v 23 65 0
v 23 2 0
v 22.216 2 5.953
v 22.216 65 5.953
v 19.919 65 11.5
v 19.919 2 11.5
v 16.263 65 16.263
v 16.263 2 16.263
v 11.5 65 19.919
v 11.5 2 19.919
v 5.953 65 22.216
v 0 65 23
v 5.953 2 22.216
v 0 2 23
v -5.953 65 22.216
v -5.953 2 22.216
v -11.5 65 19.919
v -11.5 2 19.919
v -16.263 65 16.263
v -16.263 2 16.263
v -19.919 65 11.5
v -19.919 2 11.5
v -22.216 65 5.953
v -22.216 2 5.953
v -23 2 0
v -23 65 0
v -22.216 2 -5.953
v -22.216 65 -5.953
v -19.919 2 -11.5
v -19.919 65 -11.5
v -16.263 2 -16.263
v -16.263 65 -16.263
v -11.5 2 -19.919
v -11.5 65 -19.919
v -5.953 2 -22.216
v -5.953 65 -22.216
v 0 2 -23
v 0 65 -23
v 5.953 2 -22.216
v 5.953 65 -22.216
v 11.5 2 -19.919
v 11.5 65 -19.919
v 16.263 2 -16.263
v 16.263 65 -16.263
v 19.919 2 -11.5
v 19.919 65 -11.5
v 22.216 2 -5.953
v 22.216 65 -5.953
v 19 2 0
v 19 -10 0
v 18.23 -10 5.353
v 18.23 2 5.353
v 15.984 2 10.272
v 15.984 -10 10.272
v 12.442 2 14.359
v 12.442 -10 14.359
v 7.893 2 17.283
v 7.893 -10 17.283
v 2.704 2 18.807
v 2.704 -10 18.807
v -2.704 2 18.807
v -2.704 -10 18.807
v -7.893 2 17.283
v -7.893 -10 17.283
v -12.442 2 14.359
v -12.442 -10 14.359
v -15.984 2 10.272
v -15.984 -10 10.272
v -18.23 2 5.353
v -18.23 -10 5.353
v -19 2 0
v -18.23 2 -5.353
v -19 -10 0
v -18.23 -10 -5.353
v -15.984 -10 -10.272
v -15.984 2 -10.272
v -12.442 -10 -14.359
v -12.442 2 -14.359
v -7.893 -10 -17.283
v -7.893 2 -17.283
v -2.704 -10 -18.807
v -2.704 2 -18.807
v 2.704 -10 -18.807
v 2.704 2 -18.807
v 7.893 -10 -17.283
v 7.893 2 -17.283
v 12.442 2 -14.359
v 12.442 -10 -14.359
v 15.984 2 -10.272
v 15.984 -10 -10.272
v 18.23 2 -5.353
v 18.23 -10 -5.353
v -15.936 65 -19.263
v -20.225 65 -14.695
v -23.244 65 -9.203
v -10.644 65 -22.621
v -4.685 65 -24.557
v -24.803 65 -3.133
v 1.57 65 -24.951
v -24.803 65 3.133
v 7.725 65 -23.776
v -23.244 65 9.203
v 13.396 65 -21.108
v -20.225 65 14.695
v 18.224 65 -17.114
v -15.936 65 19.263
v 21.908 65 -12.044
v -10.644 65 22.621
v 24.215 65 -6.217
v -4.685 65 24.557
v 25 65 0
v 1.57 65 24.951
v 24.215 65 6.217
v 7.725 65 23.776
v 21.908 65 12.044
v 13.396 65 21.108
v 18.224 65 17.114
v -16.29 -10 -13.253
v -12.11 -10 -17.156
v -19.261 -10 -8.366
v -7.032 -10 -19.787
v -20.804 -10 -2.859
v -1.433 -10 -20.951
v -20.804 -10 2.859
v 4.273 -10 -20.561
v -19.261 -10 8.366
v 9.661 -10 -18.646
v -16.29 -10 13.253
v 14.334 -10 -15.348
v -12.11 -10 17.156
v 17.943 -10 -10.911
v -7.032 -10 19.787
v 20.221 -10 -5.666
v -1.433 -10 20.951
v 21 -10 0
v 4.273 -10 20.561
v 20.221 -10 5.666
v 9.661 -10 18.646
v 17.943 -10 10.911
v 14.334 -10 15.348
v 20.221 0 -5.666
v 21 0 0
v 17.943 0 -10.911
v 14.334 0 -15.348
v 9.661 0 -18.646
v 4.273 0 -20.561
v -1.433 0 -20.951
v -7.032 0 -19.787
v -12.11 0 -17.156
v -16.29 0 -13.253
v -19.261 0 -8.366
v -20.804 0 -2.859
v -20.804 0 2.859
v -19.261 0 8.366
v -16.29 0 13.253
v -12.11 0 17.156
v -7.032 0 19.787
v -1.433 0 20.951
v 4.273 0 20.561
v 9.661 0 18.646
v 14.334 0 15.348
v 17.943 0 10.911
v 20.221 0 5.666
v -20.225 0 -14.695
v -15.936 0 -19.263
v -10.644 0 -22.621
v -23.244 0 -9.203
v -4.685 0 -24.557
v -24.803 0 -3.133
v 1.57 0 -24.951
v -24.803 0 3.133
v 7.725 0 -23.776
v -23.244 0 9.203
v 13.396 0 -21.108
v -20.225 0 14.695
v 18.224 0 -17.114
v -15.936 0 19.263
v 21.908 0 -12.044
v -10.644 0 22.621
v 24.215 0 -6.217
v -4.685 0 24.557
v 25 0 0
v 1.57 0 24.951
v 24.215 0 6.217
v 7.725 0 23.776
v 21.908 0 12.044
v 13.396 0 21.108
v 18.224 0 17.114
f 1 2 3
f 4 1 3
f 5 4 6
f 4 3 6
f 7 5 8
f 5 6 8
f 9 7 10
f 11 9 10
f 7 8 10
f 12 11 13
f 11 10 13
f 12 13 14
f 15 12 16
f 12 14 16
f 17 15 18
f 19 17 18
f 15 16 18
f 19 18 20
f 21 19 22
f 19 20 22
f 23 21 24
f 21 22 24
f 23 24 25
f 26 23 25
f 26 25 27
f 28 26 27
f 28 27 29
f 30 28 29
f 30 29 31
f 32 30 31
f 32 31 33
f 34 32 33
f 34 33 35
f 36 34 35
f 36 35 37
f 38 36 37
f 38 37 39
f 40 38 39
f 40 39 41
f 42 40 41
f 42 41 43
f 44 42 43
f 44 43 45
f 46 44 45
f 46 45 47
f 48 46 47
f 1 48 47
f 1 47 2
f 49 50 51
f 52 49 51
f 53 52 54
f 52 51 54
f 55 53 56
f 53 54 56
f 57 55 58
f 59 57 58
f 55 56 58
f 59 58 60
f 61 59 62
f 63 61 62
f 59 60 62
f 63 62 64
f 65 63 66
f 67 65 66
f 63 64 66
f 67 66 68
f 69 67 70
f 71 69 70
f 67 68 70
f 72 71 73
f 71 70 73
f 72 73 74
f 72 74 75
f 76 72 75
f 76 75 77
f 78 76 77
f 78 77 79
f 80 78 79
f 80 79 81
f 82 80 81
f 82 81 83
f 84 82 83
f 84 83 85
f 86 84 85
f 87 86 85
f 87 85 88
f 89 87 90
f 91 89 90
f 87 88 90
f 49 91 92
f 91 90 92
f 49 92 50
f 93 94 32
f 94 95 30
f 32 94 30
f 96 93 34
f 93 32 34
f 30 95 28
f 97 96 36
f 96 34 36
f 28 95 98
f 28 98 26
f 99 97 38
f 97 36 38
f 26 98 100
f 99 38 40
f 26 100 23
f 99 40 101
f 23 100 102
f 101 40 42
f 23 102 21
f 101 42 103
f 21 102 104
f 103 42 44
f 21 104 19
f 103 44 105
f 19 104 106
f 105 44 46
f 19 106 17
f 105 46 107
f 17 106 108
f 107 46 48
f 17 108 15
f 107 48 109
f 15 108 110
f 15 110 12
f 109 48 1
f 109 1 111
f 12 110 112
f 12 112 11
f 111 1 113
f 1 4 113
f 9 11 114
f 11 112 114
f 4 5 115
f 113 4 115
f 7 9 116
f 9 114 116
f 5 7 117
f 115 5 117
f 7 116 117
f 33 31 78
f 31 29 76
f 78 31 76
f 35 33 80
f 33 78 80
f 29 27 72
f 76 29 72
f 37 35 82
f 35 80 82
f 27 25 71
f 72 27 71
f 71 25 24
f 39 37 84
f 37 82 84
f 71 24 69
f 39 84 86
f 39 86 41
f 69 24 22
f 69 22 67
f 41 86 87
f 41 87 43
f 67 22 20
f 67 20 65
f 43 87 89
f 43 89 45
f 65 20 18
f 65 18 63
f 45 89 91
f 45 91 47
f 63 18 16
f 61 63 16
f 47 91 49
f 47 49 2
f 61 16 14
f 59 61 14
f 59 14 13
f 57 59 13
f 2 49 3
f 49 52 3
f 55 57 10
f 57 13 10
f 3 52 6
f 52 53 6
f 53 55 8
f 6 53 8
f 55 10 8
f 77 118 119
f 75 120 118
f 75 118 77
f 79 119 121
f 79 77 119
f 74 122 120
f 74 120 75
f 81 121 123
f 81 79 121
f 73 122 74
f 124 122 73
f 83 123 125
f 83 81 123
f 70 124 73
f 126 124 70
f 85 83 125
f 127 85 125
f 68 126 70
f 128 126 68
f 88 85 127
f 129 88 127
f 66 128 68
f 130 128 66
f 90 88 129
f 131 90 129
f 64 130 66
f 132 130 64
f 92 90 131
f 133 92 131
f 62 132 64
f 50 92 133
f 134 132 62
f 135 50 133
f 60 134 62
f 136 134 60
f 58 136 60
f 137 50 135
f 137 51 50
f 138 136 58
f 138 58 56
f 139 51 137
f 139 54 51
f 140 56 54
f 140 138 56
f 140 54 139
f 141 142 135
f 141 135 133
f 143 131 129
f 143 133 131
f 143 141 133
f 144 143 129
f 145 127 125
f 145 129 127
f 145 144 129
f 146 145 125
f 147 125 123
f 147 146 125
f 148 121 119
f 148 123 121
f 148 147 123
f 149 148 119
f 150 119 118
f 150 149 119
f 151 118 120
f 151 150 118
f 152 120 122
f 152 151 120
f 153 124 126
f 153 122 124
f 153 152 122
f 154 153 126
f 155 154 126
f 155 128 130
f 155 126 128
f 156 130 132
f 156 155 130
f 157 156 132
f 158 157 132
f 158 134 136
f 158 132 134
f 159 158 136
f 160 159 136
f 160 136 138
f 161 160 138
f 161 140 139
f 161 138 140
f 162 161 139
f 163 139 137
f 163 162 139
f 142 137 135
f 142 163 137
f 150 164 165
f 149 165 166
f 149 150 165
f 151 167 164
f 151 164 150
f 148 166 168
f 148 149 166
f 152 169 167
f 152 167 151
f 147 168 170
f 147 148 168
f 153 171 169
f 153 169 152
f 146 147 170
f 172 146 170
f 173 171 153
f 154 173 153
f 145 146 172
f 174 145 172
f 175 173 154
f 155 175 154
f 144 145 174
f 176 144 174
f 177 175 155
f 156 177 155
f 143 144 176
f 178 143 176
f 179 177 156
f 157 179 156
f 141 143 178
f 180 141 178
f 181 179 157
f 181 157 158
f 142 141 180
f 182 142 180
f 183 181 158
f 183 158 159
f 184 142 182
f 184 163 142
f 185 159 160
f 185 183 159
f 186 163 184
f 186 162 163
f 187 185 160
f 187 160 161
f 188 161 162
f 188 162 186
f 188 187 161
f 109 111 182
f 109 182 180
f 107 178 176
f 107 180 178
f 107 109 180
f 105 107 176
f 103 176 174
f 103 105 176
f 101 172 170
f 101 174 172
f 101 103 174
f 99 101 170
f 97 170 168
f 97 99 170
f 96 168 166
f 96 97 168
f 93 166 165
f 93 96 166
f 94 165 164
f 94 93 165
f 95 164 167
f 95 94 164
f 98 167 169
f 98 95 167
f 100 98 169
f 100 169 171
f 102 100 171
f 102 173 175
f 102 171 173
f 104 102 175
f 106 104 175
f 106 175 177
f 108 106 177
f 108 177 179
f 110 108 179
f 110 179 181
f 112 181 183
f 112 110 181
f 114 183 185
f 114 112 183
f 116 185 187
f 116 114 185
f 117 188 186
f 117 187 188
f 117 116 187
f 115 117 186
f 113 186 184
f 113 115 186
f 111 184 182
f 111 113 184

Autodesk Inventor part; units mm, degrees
ref_plane "YZ Plane" through (0, 0, 0) normal (1, 0, 0) x (0, 1, 0)
ref_plane "XZ Plane" through (0, 0, 0) normal (0, 1, 0) x (-1, 0, 0)
ref_plane "XY Plane" through (0, 0, 0) normal (0, 0, 1) x (1, 0, 0)
sketch "Sketch1" plane through (0, 0, 0) normal (0, 0, 1) x (1, 0, 0)
  line L0 (0, 0) -> (25, 0) construction
  line L1 (25, 0) -> (25, 65) construction
  line L2 (25, 65) -> (0, 65) construction
  line L3 (0, 65) -> (0, 0) construction
  line L4 (25, 65) -> (23, 65)
  line L5 (23, 65) -> (23, 0)
  line L6 (23, 0) -> (25, 0)
  line L7 (25, 0) -> (25, 65)
  line L8 (0, 0) -> (21, 0) construction
  line L9 (21, 0) -> (21, -10) construction
  line L10 (21, -10) -> (0, -10) construction
  line L11 (0, -10) -> (0, 0) construction
  line L12 (21, 0) -> (19, 0)
  line L13 (19, 0) -> (19, -10)
  line L14 (19, -10) -> (21, -10)
  line L15 (21, -10) -> (21, 0)
  line L16 (19, 0) -> (25, 0)
  line L17 (25, 0) -> (25, 2)
  line L18 (25, 2) -> (19, 2)
  line L19 (19, 2) -> (19, 0)
  point P0 (23, 2)
  dimension "d0" = 25
  dimension "d1" = 65
  dimension "d2" = 2
  dimension "d3" = 21
  dimension "d4" = 10
  dimension "d5" = 2
  dimension "d6" = 2
revolve "Revolution1" add sketch "Sketch1" angle 360 about axis through (0, 65, 0) along (0, -1, 0)
properties part number "flour_duct"
